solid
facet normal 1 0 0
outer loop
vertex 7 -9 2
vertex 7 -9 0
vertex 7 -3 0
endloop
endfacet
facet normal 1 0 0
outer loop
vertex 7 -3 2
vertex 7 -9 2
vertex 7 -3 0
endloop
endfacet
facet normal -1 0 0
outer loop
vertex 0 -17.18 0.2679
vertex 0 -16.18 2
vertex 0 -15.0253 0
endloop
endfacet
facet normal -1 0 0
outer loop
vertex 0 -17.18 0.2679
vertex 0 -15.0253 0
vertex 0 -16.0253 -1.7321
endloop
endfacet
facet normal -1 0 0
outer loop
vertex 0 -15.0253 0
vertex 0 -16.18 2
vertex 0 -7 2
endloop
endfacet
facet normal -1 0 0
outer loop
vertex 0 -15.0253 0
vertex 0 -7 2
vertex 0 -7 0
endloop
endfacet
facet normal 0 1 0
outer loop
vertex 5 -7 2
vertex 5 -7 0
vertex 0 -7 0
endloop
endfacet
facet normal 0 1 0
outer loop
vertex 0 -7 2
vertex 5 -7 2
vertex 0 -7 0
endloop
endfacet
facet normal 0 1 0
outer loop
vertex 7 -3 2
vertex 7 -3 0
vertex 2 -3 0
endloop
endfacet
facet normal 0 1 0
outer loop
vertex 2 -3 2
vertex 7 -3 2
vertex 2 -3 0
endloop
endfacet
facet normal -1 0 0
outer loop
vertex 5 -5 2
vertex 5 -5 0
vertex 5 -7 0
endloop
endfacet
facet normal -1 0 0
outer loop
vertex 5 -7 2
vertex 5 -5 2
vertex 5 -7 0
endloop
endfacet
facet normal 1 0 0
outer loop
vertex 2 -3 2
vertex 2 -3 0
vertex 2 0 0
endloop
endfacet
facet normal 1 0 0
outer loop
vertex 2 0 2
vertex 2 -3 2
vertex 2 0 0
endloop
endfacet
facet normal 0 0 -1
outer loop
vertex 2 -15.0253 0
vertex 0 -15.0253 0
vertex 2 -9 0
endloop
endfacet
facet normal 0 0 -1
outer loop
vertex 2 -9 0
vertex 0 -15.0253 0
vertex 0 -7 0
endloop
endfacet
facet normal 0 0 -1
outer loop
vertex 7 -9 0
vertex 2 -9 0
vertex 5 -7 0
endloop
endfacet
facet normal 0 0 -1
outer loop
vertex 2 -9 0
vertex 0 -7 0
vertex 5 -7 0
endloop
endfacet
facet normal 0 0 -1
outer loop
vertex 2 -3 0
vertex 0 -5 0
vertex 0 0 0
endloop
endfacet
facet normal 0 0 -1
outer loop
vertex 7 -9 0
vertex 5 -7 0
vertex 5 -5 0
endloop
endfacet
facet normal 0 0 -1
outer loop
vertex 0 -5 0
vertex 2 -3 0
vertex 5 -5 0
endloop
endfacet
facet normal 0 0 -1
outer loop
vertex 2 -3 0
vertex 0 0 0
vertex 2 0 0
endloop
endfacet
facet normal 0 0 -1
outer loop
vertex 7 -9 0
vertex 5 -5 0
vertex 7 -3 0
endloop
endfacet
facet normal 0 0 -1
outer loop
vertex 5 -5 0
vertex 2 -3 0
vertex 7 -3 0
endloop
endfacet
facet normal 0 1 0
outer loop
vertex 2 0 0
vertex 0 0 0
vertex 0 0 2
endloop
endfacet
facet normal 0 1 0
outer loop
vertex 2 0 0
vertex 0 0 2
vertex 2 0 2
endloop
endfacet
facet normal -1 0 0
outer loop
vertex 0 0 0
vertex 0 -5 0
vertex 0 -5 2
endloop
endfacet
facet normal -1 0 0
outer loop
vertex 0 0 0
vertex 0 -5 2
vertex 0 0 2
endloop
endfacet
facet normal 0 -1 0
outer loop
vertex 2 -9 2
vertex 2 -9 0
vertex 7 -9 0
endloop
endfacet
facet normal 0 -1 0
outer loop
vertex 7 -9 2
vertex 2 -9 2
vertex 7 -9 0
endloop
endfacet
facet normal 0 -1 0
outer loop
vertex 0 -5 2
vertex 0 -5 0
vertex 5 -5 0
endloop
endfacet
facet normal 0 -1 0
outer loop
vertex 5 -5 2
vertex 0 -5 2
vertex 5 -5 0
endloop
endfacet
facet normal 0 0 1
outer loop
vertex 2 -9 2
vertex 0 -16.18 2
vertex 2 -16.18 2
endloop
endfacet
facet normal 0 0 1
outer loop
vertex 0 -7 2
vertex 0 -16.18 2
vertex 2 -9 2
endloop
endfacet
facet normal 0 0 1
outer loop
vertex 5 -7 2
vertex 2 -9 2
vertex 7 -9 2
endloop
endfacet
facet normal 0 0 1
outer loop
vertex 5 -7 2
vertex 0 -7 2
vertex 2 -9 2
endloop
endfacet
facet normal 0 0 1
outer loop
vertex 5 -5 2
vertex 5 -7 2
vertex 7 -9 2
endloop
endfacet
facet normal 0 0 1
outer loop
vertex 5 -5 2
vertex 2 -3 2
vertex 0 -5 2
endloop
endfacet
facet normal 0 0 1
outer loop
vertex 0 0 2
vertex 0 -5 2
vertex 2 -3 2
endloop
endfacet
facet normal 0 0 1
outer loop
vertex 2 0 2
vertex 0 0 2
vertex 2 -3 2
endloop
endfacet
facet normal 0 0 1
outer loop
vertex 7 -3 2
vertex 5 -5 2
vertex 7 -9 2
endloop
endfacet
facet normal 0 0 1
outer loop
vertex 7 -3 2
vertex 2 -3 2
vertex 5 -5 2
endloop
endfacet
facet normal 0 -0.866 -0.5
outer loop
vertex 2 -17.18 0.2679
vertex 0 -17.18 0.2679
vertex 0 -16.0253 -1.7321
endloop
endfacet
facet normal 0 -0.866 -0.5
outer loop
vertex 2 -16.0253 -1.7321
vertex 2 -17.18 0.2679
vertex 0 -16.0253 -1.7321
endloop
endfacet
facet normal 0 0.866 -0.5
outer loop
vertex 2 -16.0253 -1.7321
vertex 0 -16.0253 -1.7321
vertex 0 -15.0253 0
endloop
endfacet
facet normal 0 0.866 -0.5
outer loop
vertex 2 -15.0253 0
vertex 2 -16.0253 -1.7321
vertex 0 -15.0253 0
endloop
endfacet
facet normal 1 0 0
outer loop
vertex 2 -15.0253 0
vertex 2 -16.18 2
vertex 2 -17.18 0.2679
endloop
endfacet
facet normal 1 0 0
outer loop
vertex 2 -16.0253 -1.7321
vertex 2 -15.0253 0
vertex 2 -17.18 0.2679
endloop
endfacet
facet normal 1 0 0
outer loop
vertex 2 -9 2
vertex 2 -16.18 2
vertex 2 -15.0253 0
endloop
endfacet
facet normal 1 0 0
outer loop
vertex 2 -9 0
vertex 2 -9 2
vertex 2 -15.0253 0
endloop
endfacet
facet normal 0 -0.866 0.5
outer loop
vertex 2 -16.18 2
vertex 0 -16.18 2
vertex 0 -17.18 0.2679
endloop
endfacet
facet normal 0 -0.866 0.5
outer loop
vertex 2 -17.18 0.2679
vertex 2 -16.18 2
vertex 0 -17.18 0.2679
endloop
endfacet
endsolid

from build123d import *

# Parameters (mm, degrees)
SKETCH_1_W      = 2
SKETCH_1_H      = 7.18
SKETCH_1_H_2    = 5
EXTRUDE_1_DEPTH = 2
EXTRUDE_2_DEPTH = 2


with BuildPart() as part:
    # 草图1 → 凸台-拉伸1 (new body)
    with BuildSketch(Plane.XY):
        with Locations((1, -12.59)):
            Rectangle(SKETCH_1_W, SKETCH_1_H)
        Polygon((5, -9), (5, -7), (0, -7), (0, -9), (2, -9), align=None)
        Polygon((7, -5), (5, -5), (5, -7), (5, -9), (7, -9), align=None)
        with Locations((1, -2.5)):
            Rectangle(SKETCH_1_W, SKETCH_1_H_2)
        Polygon((7, -3), (2, -3), (2, -5), (5, -5), (7, -5), align=None)
    extrude(amount=EXTRUDE_1_DEPTH)

    # 草图2 → 凸台-拉伸2 (add)
    with BuildSketch(Plane.ZY):
        Polygon((2, -16.18), (0.267949192, -17.18), (-1.732050808, -16.025299462), (0, -15.025299462), align=None)
    extrude(amount=-EXTRUDE_2_DEPTH)


solid = part.part
